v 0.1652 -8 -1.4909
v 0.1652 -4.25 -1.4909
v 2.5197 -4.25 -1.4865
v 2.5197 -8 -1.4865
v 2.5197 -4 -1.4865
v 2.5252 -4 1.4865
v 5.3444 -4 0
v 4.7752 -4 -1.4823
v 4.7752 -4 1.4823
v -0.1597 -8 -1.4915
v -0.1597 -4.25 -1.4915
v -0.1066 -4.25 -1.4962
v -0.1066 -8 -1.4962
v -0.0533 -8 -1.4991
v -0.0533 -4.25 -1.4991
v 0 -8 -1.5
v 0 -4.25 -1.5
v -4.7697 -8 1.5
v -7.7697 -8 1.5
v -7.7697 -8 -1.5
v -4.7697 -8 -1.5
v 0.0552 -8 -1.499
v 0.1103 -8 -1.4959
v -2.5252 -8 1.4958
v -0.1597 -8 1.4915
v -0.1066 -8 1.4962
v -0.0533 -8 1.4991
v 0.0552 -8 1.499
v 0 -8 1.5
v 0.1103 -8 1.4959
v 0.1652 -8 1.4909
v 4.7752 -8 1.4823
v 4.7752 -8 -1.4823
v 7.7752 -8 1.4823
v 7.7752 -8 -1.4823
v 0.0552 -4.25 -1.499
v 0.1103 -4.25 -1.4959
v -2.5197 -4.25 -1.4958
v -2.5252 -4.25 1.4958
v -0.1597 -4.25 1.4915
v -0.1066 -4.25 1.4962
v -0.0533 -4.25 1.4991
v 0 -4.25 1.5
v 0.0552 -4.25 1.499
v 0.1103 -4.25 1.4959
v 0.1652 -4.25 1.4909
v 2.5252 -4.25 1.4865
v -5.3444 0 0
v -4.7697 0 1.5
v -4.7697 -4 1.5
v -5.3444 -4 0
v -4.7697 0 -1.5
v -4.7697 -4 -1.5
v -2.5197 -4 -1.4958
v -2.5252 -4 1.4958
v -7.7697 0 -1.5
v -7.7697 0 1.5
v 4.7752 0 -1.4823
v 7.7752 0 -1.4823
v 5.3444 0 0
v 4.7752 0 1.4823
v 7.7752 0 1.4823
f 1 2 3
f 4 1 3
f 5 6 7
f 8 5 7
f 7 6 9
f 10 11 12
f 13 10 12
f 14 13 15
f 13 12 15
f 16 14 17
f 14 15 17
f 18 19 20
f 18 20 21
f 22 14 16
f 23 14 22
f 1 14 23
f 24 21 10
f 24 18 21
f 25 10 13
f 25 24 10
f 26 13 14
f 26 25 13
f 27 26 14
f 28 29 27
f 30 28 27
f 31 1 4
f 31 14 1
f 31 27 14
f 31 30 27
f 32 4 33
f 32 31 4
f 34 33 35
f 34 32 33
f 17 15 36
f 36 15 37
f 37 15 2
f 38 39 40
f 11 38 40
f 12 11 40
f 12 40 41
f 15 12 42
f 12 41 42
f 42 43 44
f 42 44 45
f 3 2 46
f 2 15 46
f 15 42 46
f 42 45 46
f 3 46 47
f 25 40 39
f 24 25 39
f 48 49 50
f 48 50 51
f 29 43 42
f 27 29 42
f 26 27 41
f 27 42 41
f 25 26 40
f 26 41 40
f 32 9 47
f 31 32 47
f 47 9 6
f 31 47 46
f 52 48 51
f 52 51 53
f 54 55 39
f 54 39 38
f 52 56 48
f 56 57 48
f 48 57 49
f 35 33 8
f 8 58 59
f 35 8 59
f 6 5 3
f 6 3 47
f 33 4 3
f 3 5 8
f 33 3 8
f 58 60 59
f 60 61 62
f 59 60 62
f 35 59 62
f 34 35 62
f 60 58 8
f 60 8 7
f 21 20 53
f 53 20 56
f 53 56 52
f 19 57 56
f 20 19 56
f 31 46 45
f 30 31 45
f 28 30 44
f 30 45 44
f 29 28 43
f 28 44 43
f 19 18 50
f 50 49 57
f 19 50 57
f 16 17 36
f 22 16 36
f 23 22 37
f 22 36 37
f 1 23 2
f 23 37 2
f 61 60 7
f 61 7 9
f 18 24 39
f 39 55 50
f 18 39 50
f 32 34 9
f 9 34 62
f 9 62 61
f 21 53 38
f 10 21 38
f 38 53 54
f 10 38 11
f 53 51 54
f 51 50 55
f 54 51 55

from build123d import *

# Parameters (mm, degrees)
F1_DEPTH = 8
F2_DEPTH = 4
F3_DEPTH = 4.25


# Not quite as in the source:
# - a feature of the source that left no trace in its solid (it failed there, or was rolled back) is left out


with BuildPart() as f1:
    # F0 (on Front) → F1 (new body)
    with BuildSketch(Plane.XZ):
        with BuildLine():
            Line((2.5197209473, -1.4865167008), (2.5252201747, 1.4865065289))
            Line((2.5252201747, 1.4865065289), (0.1652307775, 1.4908718222))
            ThreePointArc((0.1652307775, 1.4908718222), (1.1175522731, 1.0005383135), (1.5, 0))
            ThreePointArc((1.5, 0), (1.1175522731, -1.0005383135), (0.1652307775, -1.4908718222))
            Line((0.1652307775, -1.4908718222), (2.5197209473, -1.4865167008))
        make_face()
        Polygon((-5.3444080986, 0), (-4.7696960071, 1.5), (-7.7696960071, 1.5), (-7.7696960071, -1.5), (-4.7696960071, -1.5), align=None)
        Polygon((7.7752124765, 1.4823446982), (4.7752124765, 1.4823446982), (5.3444080986, 0), (4.7752124765, -1.4823446982), (7.7752124765, -1.4823446982), align=None)
        with BuildLine():
            ThreePointArc((-4.7696960071, -1.5), (-5, 0), (-4.7696960071, 1.5))
            Line((-4.7696960071, 1.5), (-5.3444080986, 0))
            Line((-5.3444080986, 0), (-4.7696960071, -1.5))
        make_face()
        with BuildLine():
            Line((5.3444080986, 0), (4.7752124765, 1.4823446982))
            ThreePointArc((4.7752124765, 1.4823446982), (4.94348371, 0.7496457888), (5, 0))
            ThreePointArc((5, 0), (4.94348371, -0.7496457888), (4.7752124765, -1.4823446982))
            Line((4.7752124765, -1.4823446982), (5.3444080986, 0))
        make_face()
        with BuildLine():
            Line((-2.5252374544, 1.4958484051), (-4.7696960071, 1.5))
            ThreePointArc((-4.7696960071, 1.5), (-5, 0), (-4.7696960071, -1.5))
            Line((-4.7696960071, -1.5), (-2.5197037053, -1.4958381693))
            Line((-2.5197037053, -1.4958381693), (-2.5252374544, 1.4958484051))
        make_face()
        with BuildLine():
            ThreePointArc((5, 0), (4.94348371, 0.7496457888), (4.7752124765, 1.4823446982))
            Line((4.7752124765, 1.4823446982), (2.5252201747, 1.4865065289))
            Line((2.5252201747, 1.4865065289), (2.5197209473, -1.4865167008))
            Line((2.5197209473, -1.4865167008), (4.7752124765, -1.4823446982))
            ThreePointArc((4.7752124765, -1.4823446982), (4.94348371, -0.7496457888), (5, 0))
        make_face()
        with BuildLine():
            Line((0, 1.491177451), (-0.1597143081, 1.491472876))
            ThreePointArc((-0.1597143081, 1.491472876), (-1.5, 0), (-0.1597143081, -1.491472876))
            Line((-0.1597143081, -1.491472876), (0, -1.491177451))
            Line((0, -1.491177451), (0, 1.491177451))
        make_face()
        with BuildLine():
            Line((-0.1597143081, 1.491472876), (-2.5252374544, 1.4958484051))
            Line((-2.5252374544, 1.4958484051), (-2.5197037053, -1.4958381693))
            Line((-2.5197037053, -1.4958381693), (-0.1597143081, -1.491472876))
            ThreePointArc((-0.1597143081, -1.491472876), (-1.5, 0), (-0.1597143081, 1.491472876))
        make_face()
        with BuildLine():
            ThreePointArc((1.5, 0), (1.1175522731, 1.0005383135), (0.1652307775, 1.4908718222))
            Line((0.1652307775, 1.4908718222), (0, 1.491177451))
            Line((0, 1.491177451), (0, -1.491177451))
            Line((0, -1.491177451), (0.1652307775, -1.4908718222))
            ThreePointArc((0.1652307775, -1.4908718222), (1.1175522731, -1.0005383135), (1.5, 0))
        make_face()
        with BuildLine():
            Line((0, 1.491177451), (0.1652307775, 1.4908718222))
            ThreePointArc((0.1652307775, 1.4908718222), (0.0827413643, 1.497716217), (0, 1.5))
            Line((0, 1.5), (0, 1.491177451))
        make_face()
        with BuildLine():
            ThreePointArc((0, 1.5), (-0.0799708885, 1.497866702), (-0.1597143081, 1.491472876))
            Line((-0.1597143081, 1.491472876), (0, 1.491177451))
            Line((0, 1.491177451), (0, 1.5))
        make_face()
        with BuildLine():
            Line((0, -1.491177451), (-0.1597143081, -1.491472876))
            ThreePointArc((-0.1597143081, -1.491472876), (-0.0799708885, -1.497866702), (0, -1.5))
            Line((0, -1.5), (0, -1.491177451))
        make_face()
        with BuildLine():
            ThreePointArc((0, -1.5), (0.0827413643, -1.497716217), (0.1652307775, -1.4908718222))
            Line((0.1652307775, -1.4908718222), (0, -1.491177451))
            Line((0, -1.491177451), (0, -1.5))
        make_face()
    extrude(amount=F1_DEPTH)

    # F0 (on Front) → F2 (cut)
    with BuildSketch(Plane.XZ):
        with BuildLine():
            Line((5.3444080986, 0), (4.7752124765, 1.4823446982))
            ThreePointArc((4.7752124765, 1.4823446982), (4.94348371, 0.7496457888), (5, 0))
            ThreePointArc((5, 0), (4.94348371, -0.7496457888), (4.7752124765, -1.4823446982))
            Line((4.7752124765, -1.4823446982), (5.3444080986, 0))
        make_face()
        with BuildLine():
            ThreePointArc((5, 0), (4.94348371, 0.7496457888), (4.7752124765, 1.4823446982))
            Line((4.7752124765, 1.4823446982), (2.5252201747, 1.4865065289))
            Line((2.5252201747, 1.4865065289), (2.5197209473, -1.4865167008))
            Line((2.5197209473, -1.4865167008), (4.7752124765, -1.4823446982))
            ThreePointArc((4.7752124765, -1.4823446982), (4.94348371, -0.7496457888), (5, 0))
        make_face()
        with BuildLine():
            Line((2.5197209473, -1.4865167008), (2.5252201747, 1.4865065289))
            Line((2.5252201747, 1.4865065289), (0.1652307775, 1.4908718222))
            ThreePointArc((0.1652307775, 1.4908718222), (1.1175522731, 1.0005383135), (1.5, 0))
            ThreePointArc((1.5, 0), (1.1175522731, -1.0005383135), (0.1652307775, -1.4908718222))
            Line((0.1652307775, -1.4908718222), (2.5197209473, -1.4865167008))
        make_face()
        with BuildLine():
            ThreePointArc((1.5, 0), (1.1175522731, 1.0005383135), (0.1652307775, 1.4908718222))
            Line((0.1652307775, 1.4908718222), (0, 1.491177451))
            Line((0, 1.491177451), (0, -1.491177451))
            Line((0, -1.491177451), (0.1652307775, -1.4908718222))
            ThreePointArc((0.1652307775, -1.4908718222), (1.1175522731, -1.0005383135), (1.5, 0))
        make_face()
        with BuildLine():
            Line((0, 1.491177451), (-0.1597143081, 1.491472876))
            ThreePointArc((-0.1597143081, 1.491472876), (-1.5, 0), (-0.1597143081, -1.491472876))
            Line((-0.1597143081, -1.491472876), (0, -1.491177451))
            Line((0, -1.491177451), (0, 1.491177451))
        make_face()
        with BuildLine():
            Line((-0.1597143081, 1.491472876), (-2.5252374544, 1.4958484051))
            Line((-2.5252374544, 1.4958484051), (-2.5197037053, -1.4958381693))
            Line((-2.5197037053, -1.4958381693), (-0.1597143081, -1.491472876))
            ThreePointArc((-0.1597143081, -1.491472876), (-1.5, 0), (-0.1597143081, 1.491472876))
        make_face()
        with BuildLine():
            Line((-2.5252374544, 1.4958484051), (-4.7696960071, 1.5))
            ThreePointArc((-4.7696960071, 1.5), (-5, 0), (-4.7696960071, -1.5))
            Line((-4.7696960071, -1.5), (-2.5197037053, -1.4958381693))
            Line((-2.5197037053, -1.4958381693), (-2.5252374544, 1.4958484051))
        make_face()
        with BuildLine():
            ThreePointArc((-4.7696960071, -1.5), (-5, 0), (-4.7696960071, 1.5))
            Line((-4.7696960071, 1.5), (-5.3444080986, 0))
            Line((-5.3444080986, 0), (-4.7696960071, -1.5))
        make_face()
    extrude(amount=F2_DEPTH, mode=Mode.SUBTRACT)

    # F0 (on Front) → F3 (cut)
    with BuildSketch(Plane.XZ):
        with BuildLine():
            Line((2.5197209473, -1.4865167008), (2.5252201747, 1.4865065289))
            Line((2.5252201747, 1.4865065289), (0.1652307775, 1.4908718222))
            ThreePointArc((0.1652307775, 1.4908718222), (1.1175522731, 1.0005383135), (1.5, 0))
            ThreePointArc((1.5, 0), (1.1175522731, -1.0005383135), (0.1652307775, -1.4908718222))
            Line((0.1652307775, -1.4908718222), (2.5197209473, -1.4865167008))
        make_face()
        with BuildLine():
            ThreePointArc((1.5, 0), (1.1175522731, 1.0005383135), (0.1652307775, 1.4908718222))
            Line((0.1652307775, 1.4908718222), (0, 1.491177451))
            Line((0, 1.491177451), (0, -1.491177451))
            Line((0, -1.491177451), (0.1652307775, -1.4908718222))
            ThreePointArc((0.1652307775, -1.4908718222), (1.1175522731, -1.0005383135), (1.5, 0))
        make_face()
        with BuildLine():
            Line((-0.1597143081, 1.491472876), (-2.5252374544, 1.4958484051))
            Line((-2.5252374544, 1.4958484051), (-2.5197037053, -1.4958381693))
            Line((-2.5197037053, -1.4958381693), (-0.1597143081, -1.491472876))
            ThreePointArc((-0.1597143081, -1.491472876), (-1.5, 0), (-0.1597143081, 1.491472876))
        make_face()
        with BuildLine():
            Line((0, 1.491177451), (-0.1597143081, 1.491472876))
            ThreePointArc((-0.1597143081, 1.491472876), (-1.5, 0), (-0.1597143081, -1.491472876))
            Line((-0.1597143081, -1.491472876), (0, -1.491177451))
            Line((0, -1.491177451), (0, 1.491177451))
        make_face()
        with BuildLine():
            ThreePointArc((0, 1.5), (-0.0799708885, 1.497866702), (-0.1597143081, 1.491472876))
            Line((-0.1597143081, 1.491472876), (0, 1.491177451))
            Line((0, 1.491177451), (0, 1.5))
        make_face()
        with BuildLine():
            Line((0, 1.491177451), (0.1652307775, 1.4908718222))
            ThreePointArc((0.1652307775, 1.4908718222), (0.0827413643, 1.497716217), (0, 1.5))
            Line((0, 1.5), (0, 1.491177451))
        make_face()
        with BuildLine():
            ThreePointArc((0, -1.5), (0.0827413643, -1.497716217), (0.1652307775, -1.4908718222))
            Line((0.1652307775, -1.4908718222), (0, -1.491177451))
            Line((0, -1.491177451), (0, -1.5))
        make_face()
        with BuildLine():
            Line((0, -1.491177451), (-0.1597143081, -1.491472876))
            ThreePointArc((-0.1597143081, -1.491472876), (-0.0799708885, -1.497866702), (0, -1.5))
            Line((0, -1.5), (0, -1.491177451))
        make_face()
    extrude(amount=F3_DEPTH, mode=Mode.SUBTRACT)


solid = f1.part
